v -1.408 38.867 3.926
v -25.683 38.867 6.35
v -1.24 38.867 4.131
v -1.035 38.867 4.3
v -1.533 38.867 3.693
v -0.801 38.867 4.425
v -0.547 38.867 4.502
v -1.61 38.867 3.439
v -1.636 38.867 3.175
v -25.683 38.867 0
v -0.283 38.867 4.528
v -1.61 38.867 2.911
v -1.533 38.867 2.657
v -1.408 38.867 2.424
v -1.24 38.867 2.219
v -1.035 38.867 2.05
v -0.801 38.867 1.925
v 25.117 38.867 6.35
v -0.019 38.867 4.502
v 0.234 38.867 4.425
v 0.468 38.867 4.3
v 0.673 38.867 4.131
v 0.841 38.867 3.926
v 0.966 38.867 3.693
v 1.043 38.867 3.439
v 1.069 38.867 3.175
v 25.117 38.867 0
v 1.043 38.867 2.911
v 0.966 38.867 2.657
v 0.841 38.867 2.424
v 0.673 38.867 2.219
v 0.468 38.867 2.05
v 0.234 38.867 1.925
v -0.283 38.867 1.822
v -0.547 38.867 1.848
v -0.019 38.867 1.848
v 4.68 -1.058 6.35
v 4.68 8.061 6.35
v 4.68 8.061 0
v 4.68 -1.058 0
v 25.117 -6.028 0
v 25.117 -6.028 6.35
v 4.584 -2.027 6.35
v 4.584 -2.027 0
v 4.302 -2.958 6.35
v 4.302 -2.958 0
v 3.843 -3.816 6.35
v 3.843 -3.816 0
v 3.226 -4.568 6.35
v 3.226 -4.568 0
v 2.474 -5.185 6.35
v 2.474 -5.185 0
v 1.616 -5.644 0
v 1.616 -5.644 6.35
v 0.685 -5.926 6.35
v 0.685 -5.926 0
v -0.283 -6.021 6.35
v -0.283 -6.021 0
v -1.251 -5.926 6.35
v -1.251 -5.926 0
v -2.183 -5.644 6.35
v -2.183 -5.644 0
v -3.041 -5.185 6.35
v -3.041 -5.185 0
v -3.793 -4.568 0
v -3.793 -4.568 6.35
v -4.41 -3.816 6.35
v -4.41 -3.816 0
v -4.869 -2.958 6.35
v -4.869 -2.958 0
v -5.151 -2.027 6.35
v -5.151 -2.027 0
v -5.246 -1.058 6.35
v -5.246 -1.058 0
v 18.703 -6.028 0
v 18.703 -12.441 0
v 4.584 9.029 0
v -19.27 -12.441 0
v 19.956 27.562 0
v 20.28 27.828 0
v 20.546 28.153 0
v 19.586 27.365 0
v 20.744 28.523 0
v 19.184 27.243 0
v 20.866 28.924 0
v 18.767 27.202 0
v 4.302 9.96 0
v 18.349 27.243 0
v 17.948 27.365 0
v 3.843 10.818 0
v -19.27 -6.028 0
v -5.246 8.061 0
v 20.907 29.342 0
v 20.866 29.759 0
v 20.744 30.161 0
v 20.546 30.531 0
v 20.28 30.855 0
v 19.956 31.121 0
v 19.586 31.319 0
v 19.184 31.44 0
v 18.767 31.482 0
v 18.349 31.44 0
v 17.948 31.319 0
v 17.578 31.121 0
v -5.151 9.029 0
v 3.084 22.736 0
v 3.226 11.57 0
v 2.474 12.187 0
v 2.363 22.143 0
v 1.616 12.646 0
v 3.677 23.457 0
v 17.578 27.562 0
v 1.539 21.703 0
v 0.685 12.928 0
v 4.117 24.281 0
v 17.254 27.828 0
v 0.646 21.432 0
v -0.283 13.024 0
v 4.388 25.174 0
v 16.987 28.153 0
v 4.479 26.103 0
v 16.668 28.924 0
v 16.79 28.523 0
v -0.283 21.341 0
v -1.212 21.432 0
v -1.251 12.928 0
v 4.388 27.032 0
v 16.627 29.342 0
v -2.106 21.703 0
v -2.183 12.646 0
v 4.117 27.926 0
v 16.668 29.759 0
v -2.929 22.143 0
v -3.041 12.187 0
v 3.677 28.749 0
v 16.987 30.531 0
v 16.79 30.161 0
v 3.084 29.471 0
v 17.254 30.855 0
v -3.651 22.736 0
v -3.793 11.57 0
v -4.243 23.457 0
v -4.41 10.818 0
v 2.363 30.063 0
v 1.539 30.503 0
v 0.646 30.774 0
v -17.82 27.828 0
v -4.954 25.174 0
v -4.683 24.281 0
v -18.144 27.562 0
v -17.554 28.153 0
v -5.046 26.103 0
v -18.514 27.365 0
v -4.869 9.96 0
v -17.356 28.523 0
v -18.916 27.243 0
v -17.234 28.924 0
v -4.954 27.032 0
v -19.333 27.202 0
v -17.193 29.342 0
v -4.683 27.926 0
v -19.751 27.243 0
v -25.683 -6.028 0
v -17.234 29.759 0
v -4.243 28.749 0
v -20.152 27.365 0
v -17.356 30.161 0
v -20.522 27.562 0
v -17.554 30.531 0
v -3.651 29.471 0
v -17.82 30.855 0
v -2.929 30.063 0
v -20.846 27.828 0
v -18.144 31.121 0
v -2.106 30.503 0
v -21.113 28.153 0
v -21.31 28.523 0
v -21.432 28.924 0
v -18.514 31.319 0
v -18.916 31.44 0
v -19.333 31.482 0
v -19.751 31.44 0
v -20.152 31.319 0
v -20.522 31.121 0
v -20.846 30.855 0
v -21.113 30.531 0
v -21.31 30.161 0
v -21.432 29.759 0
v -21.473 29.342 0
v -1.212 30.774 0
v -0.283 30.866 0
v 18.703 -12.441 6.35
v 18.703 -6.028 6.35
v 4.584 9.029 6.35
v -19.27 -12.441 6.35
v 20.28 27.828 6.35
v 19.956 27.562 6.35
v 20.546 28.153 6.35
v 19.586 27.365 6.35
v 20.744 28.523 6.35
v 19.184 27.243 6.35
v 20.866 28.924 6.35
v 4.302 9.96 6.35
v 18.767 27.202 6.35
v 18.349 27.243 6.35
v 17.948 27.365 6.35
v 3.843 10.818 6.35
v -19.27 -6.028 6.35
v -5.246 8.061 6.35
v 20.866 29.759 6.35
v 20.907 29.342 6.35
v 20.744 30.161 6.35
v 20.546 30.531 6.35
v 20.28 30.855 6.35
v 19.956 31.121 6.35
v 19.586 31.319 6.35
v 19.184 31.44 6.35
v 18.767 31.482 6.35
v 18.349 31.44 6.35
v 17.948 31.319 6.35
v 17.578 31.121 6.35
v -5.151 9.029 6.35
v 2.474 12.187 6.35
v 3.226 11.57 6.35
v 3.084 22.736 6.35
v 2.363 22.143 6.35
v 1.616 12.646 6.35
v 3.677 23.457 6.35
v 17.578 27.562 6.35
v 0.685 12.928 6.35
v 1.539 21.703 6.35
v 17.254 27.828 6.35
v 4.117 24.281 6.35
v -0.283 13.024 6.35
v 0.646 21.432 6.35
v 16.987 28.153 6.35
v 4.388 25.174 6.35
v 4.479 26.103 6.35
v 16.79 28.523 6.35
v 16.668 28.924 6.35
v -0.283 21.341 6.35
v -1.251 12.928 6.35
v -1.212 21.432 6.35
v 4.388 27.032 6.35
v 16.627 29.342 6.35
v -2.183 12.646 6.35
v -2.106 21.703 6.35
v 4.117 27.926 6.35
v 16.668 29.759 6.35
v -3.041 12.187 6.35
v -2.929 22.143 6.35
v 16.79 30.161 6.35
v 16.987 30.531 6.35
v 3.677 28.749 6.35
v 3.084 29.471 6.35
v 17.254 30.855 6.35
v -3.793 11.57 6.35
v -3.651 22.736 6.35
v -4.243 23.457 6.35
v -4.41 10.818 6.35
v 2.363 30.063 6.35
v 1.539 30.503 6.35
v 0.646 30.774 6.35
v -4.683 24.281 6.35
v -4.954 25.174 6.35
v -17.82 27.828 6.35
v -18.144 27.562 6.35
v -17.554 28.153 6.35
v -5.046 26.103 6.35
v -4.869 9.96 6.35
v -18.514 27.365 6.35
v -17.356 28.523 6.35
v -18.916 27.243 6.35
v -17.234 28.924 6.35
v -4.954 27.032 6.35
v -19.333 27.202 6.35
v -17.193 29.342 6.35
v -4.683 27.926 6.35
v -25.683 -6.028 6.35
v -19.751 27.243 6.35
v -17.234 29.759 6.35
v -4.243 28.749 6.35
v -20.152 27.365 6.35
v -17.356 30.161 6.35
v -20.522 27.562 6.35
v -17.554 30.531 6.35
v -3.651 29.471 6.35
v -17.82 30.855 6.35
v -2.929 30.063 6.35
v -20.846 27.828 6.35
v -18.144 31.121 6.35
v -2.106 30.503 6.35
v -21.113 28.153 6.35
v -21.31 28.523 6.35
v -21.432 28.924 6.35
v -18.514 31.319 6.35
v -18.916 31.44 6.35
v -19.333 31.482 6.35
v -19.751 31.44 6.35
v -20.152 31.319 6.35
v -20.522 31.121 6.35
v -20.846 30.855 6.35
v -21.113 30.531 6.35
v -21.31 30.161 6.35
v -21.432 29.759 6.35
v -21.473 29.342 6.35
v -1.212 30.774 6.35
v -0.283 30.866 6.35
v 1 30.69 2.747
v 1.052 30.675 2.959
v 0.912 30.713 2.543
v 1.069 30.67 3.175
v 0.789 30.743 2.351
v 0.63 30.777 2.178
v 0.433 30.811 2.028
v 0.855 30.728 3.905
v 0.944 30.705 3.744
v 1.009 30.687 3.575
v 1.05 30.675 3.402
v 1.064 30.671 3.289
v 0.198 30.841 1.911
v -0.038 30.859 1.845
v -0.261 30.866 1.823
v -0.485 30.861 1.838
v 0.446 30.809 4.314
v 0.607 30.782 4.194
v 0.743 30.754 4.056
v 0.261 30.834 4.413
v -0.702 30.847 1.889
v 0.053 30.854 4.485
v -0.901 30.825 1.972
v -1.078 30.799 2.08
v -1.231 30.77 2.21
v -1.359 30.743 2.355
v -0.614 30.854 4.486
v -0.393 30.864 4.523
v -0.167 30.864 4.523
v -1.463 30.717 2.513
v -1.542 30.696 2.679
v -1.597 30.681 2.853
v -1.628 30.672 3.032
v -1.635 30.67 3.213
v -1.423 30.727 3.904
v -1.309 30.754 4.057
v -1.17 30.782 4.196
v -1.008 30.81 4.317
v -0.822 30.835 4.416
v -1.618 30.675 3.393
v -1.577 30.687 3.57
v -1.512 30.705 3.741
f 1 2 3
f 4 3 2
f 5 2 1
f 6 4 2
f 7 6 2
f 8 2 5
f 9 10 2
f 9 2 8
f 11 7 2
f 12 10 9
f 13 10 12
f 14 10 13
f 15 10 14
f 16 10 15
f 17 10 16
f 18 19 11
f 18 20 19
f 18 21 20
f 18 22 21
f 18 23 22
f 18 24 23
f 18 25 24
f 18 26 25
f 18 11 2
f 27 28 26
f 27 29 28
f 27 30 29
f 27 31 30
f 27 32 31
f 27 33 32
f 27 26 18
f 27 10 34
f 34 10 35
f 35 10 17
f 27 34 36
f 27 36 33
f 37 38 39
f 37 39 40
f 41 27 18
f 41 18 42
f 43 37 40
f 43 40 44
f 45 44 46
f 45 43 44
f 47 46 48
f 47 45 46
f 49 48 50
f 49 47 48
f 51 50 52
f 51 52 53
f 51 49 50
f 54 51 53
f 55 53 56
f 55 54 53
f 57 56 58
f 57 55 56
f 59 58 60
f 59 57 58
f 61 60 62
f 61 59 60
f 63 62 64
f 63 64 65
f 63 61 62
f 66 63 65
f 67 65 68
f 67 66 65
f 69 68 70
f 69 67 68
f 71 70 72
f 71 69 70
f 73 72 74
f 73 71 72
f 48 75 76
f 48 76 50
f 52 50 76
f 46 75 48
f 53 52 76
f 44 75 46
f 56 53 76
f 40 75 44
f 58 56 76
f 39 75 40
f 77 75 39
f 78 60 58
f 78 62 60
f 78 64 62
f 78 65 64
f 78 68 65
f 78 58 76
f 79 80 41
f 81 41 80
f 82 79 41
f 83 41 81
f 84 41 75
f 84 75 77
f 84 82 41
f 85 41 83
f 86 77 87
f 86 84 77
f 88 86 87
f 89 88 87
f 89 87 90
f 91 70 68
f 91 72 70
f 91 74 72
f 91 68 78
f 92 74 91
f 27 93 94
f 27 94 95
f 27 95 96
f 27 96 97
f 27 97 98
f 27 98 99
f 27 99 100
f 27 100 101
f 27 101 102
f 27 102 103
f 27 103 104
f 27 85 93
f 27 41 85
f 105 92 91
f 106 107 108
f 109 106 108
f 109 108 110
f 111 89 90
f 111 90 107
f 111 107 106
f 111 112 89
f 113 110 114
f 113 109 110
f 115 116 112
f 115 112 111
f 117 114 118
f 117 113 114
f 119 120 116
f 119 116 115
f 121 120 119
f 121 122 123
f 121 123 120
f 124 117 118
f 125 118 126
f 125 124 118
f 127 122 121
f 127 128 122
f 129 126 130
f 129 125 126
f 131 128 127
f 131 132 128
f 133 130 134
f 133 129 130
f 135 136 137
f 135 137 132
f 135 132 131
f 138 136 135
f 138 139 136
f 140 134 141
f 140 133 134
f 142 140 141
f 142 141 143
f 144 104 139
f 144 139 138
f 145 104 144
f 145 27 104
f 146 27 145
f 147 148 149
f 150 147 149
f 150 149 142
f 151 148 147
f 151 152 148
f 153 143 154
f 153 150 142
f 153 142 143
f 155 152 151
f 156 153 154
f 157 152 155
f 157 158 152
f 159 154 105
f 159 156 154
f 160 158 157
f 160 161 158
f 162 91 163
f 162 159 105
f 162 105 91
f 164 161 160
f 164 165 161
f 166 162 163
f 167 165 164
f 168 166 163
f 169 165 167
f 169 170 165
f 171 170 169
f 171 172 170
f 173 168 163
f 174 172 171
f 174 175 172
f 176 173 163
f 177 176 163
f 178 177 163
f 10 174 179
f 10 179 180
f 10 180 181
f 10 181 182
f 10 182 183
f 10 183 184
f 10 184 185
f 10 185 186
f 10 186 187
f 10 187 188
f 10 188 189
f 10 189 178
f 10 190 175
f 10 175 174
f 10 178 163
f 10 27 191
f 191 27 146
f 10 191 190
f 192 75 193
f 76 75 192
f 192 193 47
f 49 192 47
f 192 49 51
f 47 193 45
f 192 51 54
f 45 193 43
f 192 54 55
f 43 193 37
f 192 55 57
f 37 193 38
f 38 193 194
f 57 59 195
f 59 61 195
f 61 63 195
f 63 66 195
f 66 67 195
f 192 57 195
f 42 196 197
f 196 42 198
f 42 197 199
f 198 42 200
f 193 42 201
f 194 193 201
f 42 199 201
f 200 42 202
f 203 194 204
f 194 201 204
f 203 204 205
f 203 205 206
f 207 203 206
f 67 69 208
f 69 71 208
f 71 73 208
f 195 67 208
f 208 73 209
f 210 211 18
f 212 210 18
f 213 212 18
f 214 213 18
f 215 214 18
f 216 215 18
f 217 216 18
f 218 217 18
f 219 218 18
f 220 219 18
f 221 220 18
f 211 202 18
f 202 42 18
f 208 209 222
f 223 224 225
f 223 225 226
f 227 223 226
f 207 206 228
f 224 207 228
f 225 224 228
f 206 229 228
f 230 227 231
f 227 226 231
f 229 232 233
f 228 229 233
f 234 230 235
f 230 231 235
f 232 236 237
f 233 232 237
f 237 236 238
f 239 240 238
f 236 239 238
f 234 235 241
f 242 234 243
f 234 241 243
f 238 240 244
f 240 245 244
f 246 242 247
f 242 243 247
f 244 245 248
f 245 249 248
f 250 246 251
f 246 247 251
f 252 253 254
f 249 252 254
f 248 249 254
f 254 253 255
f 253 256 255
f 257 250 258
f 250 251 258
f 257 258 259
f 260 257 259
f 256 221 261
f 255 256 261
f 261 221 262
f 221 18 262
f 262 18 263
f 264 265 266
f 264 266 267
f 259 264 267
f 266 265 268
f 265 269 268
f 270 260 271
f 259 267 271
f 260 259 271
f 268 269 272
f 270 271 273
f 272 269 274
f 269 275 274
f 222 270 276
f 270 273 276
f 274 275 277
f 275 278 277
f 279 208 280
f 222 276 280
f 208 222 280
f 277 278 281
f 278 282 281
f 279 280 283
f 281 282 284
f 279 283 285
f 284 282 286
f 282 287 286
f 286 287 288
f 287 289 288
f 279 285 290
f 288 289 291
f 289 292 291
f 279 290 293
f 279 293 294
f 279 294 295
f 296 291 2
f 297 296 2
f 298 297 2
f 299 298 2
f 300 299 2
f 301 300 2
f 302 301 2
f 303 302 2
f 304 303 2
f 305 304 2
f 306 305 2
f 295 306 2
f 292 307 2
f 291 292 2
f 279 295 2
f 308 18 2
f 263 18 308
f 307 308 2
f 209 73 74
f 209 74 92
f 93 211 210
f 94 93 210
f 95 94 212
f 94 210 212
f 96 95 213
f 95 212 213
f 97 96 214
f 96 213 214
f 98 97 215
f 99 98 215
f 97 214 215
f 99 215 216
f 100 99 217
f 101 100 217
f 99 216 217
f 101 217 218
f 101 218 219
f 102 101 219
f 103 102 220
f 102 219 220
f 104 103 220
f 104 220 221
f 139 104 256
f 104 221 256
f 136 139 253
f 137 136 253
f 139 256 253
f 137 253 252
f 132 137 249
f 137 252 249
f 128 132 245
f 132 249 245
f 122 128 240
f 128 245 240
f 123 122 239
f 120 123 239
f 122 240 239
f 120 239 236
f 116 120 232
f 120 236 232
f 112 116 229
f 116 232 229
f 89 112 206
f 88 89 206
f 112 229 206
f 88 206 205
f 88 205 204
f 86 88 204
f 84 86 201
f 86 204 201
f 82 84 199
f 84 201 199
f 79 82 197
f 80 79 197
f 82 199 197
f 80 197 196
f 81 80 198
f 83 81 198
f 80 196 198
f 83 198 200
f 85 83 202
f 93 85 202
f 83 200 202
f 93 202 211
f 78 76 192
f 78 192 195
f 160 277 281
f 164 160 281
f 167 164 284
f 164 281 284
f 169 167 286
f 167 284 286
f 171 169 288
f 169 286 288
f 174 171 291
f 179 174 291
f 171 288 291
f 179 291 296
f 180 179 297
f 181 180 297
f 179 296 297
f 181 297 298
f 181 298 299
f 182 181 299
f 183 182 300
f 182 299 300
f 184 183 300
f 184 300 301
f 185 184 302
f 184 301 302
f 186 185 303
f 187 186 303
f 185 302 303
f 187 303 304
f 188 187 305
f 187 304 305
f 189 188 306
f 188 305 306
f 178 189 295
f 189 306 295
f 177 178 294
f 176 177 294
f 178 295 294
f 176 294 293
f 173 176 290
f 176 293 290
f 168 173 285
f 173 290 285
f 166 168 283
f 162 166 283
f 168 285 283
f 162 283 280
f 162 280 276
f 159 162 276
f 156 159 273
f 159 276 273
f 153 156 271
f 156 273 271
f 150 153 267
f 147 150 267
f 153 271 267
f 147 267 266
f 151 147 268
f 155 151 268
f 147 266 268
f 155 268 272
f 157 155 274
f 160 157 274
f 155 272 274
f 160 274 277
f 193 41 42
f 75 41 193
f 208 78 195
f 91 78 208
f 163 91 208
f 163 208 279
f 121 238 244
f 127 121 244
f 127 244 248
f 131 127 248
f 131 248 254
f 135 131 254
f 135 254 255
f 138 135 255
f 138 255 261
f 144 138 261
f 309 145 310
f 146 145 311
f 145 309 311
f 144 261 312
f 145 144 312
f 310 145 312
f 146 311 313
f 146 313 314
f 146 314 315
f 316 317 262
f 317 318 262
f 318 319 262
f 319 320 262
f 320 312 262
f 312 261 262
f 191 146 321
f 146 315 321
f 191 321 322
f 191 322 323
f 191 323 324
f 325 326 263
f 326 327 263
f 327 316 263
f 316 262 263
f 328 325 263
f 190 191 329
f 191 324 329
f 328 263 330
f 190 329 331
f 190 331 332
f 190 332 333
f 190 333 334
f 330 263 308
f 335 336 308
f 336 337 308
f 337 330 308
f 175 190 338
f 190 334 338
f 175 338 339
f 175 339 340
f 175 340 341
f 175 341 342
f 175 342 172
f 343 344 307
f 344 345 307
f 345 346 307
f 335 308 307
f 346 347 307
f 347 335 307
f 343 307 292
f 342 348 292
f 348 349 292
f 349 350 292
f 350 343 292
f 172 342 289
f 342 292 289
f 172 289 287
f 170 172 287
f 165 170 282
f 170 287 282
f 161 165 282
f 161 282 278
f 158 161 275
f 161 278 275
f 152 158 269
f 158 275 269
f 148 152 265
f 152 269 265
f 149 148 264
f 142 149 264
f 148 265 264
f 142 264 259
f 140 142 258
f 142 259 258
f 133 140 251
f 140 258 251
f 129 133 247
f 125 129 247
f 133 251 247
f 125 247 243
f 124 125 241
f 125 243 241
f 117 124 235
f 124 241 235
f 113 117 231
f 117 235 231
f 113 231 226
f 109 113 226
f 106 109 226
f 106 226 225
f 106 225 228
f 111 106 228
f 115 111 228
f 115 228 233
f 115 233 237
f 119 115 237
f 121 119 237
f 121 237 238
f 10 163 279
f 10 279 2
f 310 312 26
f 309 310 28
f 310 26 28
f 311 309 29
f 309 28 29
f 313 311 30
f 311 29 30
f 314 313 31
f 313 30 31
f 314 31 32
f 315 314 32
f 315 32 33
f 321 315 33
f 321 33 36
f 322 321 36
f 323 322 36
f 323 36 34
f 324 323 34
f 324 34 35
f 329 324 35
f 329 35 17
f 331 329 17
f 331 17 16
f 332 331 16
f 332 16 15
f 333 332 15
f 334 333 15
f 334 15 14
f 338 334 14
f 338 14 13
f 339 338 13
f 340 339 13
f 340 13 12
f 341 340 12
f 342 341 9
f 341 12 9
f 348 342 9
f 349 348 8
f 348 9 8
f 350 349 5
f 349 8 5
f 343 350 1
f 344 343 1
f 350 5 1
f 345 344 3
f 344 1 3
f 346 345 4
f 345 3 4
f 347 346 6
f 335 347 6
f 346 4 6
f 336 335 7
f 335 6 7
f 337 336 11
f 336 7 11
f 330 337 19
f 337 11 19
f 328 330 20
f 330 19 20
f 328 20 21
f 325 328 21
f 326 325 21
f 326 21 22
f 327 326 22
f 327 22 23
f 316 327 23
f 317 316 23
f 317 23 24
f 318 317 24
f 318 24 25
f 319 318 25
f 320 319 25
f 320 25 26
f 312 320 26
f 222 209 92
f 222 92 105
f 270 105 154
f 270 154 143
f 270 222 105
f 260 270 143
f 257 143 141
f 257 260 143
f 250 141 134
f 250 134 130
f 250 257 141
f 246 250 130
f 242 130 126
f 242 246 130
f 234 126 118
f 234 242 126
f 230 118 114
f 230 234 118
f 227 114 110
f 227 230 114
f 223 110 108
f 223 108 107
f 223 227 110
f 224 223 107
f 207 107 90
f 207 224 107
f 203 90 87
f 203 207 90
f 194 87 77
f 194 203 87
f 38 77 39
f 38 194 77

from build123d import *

# Parameters (mm, degrees)
BOSS_EXTRUDE1_DEPTH        = 6.35
SKETCH2_R                  = 4.7625
CUT_EXTRUDE1_DEPTH         = 6.35
SKETCH3_R                  = 2.13995
CUT_EXTRUDE2_DEPTH         = 6.35
CUT_EXTRUDE4_DEPTH         = 6.35
F_6_32_TAPPED_HOLE1_REACH  = 59.727
F_6_32_TAPPED_HOLE1_BORE_R = 1.35255


with BuildPart() as part:
    # Sketch1 → Boss-Extrude1 (new body)
    with BuildSketch(Plane.XY):
        Polygon((-25.683252906, 38.866643011), (25.116747094, 38.866643011), (25.116747094, -6.027856989), (18.703247094, -6.027856989), (18.703247094, -12.441356989), (-19.269752906, -12.441356989), (-19.269752906, -6.027856989), (-25.683252906, -6.027856989), align=None)
    extrude(amount=BOSS_EXTRUDE1_DEPTH)

    # Sketch2 → Cut-Extrude1 (cut)
    with BuildSketch(Plane.XY.offset(6.35)):
        with Locations((-0.283252906, 26.103143011)):
            Circle(SKETCH2_R)
    extrude(amount=-CUT_EXTRUDE1_DEPTH, mode=Mode.SUBTRACT)

    # Sketch3 → Cut-Extrude2 (cut)
    with BuildSketch(Plane.XY.offset(6.35)):
        with Locations((-19.333252906, 29.341643011)):
            Circle(SKETCH3_R)
        with Locations((18.766747094, 29.341643011)):
            Circle(SKETCH3_R)
    extrude(amount=-CUT_EXTRUDE2_DEPTH, mode=Mode.SUBTRACT)

    # Sketch6 → Cut-Extrude4 (cut)
    with BuildSketch(Plane.XY.offset(6.35)):
        with BuildLine():
            Line((4.679797411, 8.060661082), (4.679797411, -1.058338959))
            ThreePointArc((4.679797411, -1.058338959), (-0.283252906, -6.021389275), (-5.246303222, -1.058338959))
            Line((-5.246303222, -1.058338959), (-5.246303222, 8.060661082))
            ThreePointArc((-5.246303222, 8.060661082), (-0.283252906, 13.023711398), (4.679797411, 8.060661082))
        make_face()
    extrude(amount=-CUT_EXTRUDE4_DEPTH, mode=Mode.SUBTRACT)

    # #6-32 Tapped Hole1 bore → #6-32 Tapped Hole1 (cut, up to next)
    with BuildSketch(Plane(origin=(0, 38.866643011, 0), x_dir=(1, 0, 0), z_dir=(0, 1, 0)), mode=Mode.PRIVATE) as f_6_32_tapped_hole1_sk1:
        with Locations((-0.283252906, -3.175)):
            Circle(F_6_32_TAPPED_HOLE1_BORE_R)
    f_6_32_tapped_hole1_tool1 = extrude(f_6_32_tapped_hole1_sk1.sketch, amount=-F_6_32_TAPPED_HOLE1_REACH, mode=Mode.PRIVATE) & part.part
    add(f_6_32_tapped_hole1_tool1.solids().sort_by_distance((-0.283253, 38.866643, 3.175))[0], mode=Mode.SUBTRACT)


solid = part.part
